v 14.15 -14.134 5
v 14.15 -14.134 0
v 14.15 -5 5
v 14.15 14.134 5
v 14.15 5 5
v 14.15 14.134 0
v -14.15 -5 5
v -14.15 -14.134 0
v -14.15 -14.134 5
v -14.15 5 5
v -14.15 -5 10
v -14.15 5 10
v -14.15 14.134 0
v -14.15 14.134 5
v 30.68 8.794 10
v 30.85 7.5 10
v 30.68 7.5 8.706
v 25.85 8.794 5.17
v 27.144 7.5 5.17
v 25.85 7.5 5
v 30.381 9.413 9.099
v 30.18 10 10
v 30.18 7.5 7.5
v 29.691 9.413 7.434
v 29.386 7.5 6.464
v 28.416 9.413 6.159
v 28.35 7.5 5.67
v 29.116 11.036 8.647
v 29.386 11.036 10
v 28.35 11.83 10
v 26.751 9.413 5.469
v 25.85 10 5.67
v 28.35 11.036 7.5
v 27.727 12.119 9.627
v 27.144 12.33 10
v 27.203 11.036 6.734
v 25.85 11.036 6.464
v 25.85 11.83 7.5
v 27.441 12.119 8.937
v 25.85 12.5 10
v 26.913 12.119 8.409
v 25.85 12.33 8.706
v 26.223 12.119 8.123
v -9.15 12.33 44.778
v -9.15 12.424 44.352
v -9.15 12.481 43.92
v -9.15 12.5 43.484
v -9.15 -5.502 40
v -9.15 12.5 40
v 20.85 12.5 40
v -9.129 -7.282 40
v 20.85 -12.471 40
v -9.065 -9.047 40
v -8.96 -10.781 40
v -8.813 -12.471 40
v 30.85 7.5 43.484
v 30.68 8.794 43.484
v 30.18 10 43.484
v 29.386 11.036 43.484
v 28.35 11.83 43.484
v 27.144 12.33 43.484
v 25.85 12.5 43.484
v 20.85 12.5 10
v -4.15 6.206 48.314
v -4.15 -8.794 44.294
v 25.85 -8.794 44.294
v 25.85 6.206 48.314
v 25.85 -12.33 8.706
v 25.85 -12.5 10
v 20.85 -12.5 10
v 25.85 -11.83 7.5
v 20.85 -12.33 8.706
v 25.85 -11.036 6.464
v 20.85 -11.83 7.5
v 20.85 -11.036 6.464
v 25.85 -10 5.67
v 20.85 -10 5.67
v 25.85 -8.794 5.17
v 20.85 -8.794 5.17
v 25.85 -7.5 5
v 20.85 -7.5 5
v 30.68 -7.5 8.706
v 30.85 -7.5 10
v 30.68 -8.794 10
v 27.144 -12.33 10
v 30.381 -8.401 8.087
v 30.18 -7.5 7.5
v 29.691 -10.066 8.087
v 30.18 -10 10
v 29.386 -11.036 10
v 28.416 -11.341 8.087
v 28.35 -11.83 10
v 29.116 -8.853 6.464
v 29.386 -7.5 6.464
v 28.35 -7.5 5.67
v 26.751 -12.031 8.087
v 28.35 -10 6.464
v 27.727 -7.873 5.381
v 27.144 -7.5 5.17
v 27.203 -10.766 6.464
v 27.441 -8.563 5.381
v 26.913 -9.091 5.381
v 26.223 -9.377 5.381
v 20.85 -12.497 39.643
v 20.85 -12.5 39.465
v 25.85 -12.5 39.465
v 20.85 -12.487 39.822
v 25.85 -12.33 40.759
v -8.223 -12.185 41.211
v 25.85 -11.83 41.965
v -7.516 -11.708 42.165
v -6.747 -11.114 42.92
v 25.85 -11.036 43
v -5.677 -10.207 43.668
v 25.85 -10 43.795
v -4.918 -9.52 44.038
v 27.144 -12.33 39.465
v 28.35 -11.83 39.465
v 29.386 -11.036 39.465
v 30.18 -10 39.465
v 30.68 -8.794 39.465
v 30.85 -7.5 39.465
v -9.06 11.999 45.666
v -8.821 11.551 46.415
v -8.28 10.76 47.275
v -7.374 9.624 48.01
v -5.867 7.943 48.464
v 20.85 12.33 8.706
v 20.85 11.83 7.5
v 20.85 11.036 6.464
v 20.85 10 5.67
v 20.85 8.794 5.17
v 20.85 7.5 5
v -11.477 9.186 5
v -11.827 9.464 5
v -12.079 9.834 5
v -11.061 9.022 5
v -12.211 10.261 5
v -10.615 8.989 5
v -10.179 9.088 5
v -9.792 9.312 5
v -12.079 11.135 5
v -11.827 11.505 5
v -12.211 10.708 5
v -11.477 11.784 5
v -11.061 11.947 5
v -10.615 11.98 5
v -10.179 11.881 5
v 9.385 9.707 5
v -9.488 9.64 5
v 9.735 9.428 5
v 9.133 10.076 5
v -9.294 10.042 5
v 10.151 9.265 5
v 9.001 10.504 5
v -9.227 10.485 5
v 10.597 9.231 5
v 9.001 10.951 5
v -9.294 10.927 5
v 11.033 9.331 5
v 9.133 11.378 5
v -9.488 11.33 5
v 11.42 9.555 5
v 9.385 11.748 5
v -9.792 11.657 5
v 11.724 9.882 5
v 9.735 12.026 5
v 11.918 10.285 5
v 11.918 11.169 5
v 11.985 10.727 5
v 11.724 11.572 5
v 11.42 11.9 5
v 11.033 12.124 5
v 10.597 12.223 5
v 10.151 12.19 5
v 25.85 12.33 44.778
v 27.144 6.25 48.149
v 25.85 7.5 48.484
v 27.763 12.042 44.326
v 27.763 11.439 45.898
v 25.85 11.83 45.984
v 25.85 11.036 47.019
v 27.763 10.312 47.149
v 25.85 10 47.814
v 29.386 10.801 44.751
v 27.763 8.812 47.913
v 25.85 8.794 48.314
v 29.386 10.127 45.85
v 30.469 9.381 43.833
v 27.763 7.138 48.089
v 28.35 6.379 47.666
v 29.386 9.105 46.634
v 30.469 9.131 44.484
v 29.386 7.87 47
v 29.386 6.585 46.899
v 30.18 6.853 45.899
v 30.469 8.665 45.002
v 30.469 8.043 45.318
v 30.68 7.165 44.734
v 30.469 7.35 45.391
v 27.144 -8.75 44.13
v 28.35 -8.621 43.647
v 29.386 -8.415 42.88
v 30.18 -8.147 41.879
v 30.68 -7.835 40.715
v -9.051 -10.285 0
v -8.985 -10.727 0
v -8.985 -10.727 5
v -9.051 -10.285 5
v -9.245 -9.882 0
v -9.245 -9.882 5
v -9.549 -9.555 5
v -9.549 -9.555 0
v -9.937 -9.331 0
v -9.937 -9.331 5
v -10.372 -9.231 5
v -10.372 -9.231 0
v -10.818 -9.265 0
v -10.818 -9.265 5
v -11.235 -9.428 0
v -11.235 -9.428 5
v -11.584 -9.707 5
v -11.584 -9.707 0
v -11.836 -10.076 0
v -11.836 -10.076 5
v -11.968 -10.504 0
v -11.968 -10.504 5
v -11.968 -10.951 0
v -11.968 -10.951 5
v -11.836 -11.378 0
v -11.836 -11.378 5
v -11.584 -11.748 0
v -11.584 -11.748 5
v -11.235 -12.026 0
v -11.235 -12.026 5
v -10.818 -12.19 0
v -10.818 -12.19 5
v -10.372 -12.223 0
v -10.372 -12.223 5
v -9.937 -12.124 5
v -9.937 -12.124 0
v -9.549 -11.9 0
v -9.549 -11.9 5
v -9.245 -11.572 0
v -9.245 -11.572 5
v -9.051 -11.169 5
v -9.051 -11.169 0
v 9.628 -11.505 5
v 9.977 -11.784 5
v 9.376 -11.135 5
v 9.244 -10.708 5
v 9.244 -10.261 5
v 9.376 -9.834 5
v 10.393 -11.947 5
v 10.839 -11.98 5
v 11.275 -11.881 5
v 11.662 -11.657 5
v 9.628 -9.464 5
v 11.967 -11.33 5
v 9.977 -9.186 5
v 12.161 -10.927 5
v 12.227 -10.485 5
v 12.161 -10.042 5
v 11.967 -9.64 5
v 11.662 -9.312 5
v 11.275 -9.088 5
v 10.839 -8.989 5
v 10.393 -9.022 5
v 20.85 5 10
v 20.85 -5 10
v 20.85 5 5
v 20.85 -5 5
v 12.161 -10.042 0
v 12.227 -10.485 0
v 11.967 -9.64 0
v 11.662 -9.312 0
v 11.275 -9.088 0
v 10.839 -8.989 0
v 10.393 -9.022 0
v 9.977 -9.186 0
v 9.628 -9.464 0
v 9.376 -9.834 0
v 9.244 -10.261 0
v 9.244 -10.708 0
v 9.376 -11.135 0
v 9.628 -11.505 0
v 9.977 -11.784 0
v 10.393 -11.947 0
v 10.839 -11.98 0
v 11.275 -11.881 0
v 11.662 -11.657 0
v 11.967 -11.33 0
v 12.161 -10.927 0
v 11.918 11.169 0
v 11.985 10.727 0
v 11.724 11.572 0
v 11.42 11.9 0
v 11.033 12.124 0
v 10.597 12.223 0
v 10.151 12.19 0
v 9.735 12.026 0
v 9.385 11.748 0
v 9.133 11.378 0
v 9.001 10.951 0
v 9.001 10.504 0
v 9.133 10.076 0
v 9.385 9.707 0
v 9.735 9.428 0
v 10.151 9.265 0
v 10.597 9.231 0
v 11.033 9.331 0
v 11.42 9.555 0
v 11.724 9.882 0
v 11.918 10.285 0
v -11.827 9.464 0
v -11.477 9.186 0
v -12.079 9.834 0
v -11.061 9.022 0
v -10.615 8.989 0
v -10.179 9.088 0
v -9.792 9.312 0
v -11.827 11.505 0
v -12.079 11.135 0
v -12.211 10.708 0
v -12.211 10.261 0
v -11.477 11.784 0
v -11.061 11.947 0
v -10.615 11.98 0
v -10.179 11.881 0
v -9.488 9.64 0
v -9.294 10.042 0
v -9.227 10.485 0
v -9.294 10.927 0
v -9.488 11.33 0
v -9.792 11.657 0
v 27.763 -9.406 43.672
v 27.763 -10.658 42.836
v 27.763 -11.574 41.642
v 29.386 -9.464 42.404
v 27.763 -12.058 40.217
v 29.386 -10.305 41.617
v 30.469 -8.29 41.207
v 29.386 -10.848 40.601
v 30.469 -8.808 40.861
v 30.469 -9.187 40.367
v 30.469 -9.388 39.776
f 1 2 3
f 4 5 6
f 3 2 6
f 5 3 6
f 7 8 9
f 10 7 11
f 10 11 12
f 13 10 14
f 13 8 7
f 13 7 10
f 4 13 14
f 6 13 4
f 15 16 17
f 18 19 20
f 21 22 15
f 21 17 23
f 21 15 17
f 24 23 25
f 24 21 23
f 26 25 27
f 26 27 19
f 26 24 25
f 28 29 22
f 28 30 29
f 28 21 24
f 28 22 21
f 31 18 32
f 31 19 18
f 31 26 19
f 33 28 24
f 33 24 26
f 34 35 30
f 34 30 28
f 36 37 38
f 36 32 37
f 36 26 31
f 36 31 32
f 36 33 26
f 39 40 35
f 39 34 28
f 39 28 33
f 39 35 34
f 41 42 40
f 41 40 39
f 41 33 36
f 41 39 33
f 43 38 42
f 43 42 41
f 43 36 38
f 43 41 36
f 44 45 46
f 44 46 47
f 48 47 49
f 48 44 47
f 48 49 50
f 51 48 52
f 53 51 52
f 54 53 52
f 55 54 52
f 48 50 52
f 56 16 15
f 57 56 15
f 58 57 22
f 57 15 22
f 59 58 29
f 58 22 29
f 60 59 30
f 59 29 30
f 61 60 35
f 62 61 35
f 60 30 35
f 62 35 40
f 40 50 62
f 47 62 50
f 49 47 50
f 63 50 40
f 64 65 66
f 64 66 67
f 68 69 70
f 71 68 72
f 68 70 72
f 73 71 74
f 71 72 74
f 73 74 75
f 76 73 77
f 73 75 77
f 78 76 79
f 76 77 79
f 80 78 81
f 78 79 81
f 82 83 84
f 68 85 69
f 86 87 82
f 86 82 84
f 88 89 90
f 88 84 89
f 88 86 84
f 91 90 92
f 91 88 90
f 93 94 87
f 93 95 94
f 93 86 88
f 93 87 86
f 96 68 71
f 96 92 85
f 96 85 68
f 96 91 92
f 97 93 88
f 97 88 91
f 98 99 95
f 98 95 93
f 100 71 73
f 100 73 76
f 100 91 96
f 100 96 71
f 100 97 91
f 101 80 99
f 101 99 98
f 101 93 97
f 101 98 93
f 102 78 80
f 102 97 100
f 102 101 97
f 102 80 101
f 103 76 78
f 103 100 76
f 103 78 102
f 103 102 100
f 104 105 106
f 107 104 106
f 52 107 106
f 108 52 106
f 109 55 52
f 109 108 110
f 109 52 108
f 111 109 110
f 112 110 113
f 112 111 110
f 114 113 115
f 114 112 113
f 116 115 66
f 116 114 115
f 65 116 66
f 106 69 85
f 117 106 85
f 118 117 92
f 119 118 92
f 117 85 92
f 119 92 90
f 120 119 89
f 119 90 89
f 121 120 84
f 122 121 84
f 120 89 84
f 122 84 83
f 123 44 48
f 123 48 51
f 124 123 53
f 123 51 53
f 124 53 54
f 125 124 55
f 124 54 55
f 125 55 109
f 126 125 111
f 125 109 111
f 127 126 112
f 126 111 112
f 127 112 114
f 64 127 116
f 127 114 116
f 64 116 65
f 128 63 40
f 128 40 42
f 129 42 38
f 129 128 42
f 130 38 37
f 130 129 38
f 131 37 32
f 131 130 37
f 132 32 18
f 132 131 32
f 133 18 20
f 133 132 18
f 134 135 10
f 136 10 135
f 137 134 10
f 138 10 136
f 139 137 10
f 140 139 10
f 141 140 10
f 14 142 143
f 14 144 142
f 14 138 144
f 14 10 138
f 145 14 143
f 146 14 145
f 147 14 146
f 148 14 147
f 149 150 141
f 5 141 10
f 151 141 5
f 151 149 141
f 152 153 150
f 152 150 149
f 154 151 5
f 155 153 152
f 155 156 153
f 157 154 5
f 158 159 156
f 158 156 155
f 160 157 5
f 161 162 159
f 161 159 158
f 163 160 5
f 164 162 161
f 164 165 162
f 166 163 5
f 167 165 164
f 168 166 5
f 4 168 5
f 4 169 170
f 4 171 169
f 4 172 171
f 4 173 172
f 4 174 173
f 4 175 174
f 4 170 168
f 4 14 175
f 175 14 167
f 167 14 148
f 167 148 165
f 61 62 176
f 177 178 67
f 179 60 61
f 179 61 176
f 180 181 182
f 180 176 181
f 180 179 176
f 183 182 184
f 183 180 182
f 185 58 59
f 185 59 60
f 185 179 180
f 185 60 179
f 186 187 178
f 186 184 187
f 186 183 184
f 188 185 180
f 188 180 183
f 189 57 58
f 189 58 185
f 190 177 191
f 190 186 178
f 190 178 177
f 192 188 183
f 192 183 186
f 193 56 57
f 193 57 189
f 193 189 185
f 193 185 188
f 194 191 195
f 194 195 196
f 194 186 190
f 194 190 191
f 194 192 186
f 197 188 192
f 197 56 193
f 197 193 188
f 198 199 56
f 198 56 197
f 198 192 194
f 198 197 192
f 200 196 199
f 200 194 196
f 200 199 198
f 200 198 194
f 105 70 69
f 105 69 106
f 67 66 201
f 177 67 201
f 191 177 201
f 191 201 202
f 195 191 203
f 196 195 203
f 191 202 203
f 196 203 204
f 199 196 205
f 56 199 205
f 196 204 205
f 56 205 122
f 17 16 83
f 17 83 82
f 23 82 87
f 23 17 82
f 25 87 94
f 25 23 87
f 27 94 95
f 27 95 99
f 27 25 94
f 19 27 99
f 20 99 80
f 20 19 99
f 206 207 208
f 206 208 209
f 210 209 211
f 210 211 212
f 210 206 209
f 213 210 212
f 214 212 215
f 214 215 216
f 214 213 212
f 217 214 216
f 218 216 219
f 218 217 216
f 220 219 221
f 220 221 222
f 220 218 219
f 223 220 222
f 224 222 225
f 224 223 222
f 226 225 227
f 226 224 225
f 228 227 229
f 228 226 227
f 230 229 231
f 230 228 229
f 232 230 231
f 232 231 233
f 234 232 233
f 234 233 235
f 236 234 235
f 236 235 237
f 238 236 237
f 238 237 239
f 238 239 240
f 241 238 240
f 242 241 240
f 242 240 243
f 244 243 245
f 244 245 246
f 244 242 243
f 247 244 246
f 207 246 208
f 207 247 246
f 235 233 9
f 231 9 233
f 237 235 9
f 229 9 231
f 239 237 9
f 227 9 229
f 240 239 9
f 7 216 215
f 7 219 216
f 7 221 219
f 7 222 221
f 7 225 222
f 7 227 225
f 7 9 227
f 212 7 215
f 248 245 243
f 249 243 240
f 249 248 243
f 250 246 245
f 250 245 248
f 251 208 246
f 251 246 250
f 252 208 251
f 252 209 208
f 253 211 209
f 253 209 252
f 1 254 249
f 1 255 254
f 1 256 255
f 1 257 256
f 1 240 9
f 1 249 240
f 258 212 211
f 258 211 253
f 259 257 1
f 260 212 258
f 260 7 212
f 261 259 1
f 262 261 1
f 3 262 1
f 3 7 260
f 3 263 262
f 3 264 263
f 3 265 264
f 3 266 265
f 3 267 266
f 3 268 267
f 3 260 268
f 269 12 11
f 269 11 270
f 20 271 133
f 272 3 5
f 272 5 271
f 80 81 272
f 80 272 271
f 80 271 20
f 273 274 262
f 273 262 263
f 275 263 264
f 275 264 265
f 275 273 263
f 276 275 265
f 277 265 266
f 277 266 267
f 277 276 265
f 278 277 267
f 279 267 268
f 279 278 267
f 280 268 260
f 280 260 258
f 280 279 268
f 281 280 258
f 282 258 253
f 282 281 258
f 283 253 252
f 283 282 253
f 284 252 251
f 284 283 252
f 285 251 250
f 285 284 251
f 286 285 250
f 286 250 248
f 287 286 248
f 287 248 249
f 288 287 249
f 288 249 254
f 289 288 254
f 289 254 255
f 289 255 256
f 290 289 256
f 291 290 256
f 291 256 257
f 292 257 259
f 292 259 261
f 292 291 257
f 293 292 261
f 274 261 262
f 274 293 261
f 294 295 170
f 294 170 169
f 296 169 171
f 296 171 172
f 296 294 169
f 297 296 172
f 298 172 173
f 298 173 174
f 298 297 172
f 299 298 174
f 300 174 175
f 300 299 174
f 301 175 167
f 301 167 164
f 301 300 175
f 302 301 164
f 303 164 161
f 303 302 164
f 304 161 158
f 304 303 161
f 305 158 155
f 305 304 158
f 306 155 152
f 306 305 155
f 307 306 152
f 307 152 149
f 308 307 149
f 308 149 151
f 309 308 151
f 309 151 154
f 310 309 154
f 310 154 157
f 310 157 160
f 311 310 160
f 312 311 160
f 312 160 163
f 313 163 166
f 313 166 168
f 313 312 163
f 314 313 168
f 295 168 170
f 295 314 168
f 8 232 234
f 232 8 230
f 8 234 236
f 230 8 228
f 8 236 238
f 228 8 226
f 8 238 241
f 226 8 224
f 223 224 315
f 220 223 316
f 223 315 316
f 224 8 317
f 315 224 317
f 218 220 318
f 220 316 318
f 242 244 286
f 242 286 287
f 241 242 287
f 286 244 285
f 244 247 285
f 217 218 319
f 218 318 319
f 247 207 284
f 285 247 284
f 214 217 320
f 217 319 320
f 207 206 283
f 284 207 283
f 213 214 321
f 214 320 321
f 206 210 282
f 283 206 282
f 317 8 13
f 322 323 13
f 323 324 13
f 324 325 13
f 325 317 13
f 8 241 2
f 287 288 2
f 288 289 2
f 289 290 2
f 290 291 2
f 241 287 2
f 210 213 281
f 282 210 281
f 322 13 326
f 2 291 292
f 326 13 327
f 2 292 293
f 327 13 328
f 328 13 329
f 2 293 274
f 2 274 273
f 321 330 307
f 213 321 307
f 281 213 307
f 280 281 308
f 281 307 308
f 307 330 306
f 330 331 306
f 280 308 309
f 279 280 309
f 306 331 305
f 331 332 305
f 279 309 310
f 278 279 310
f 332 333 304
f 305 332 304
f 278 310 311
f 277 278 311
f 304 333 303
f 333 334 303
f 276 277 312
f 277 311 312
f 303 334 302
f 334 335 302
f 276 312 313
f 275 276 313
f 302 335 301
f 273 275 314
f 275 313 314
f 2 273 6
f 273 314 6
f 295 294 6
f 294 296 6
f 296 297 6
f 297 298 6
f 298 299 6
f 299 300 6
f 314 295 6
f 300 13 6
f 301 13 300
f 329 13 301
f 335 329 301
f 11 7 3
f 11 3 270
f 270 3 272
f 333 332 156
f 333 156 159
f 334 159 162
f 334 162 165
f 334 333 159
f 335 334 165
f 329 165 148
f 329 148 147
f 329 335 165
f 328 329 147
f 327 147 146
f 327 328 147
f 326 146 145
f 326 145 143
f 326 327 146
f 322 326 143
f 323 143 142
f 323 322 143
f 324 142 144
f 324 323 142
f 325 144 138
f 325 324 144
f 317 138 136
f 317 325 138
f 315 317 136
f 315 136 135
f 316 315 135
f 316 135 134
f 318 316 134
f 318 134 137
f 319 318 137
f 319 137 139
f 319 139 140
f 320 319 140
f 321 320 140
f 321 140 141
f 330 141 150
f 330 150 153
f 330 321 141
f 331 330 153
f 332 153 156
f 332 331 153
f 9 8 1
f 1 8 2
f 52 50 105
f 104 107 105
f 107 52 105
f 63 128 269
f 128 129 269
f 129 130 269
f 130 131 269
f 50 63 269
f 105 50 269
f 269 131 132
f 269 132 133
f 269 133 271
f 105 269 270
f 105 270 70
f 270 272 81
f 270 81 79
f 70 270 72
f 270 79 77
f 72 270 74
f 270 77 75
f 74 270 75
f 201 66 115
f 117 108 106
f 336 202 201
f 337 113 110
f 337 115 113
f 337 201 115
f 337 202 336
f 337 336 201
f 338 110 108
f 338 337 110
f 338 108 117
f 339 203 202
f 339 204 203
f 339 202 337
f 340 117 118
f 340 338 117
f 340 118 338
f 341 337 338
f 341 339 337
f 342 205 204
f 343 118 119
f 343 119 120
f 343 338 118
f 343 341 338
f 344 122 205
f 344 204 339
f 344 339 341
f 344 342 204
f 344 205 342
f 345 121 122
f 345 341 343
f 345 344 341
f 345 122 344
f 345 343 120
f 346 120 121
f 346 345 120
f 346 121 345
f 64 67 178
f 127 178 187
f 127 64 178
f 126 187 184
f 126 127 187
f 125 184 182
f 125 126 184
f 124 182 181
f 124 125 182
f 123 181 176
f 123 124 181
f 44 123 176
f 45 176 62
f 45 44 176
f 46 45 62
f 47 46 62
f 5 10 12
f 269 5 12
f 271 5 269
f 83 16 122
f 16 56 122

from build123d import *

# Parameters (mm, degrees)
F0_W          = 28.3
F0_H          = 28.2685337434
F0_R          = 1.5
F1_DEPTH      = 5
F2_W          = 45
F2_H          = 10
F3_DEPTH      = 5
F4_W          = 10
F4_H          = 25
F5_DEPTH      = 35
F7_DEPTH      = 30
F7_DEPTH_BACK = 10
F8_T1_DEPTH   = 51.2903171605
F8_T3_DEPTH   = 50.8819045103
F8_T5_DEPTH   = 44.5915873497
F8_T7_DEPTH   = 15.5291427062
F8_T9_DEPTH   = 33.4838731358
F8_T11_DEPTH  = 29.4646352493
F8_T13_DEPTH  = 15
F8_T15_DEPTH  = 17.5
F8_T20_DEPTH  = 5
F8_T26_DEPTH  = 5
F8_S31_W      = 5
F8_S31_H      = 5
F8_T32_DEPTH  = 5
F8_S37_W      = 5
F8_S37_H      = 5
F8_T38_DEPTH  = 5


# Not quite as in the source:
# - a fillet or chamfer that OpenCascade refuses, or shapes differently, is made with other operations: its cross-section is extruded or revolved along the edge and cut away or added


with BuildPart() as f1:
    # F0 (on Top) → F1 (new body)
    with BuildSketch(Plane.XY):
        Rectangle(F0_W, F0_H)
        with Locations((-10.4845586502, -10.7272564019)):
            Circle(F0_R, mode=Mode.SUBTRACT)
        with Locations((10.7272564019, -10.4845586502)):
            Circle(F0_R, mode=Mode.SUBTRACT)
        with Locations((-10.7272564019, 10.4845586502)):
            Circle(F0_R, mode=Mode.SUBTRACT)
        with Locations((10.4845586502, 10.7272564019)):
            Circle(F0_R, mode=Mode.SUBTRACT)
    extrude(amount=F1_DEPTH)

    # F2 (on face) → F3 (join)
    with BuildSketch(Plane.XY.offset(5)):
        with Locations((8.35, 0)):
            Rectangle(F2_W, F2_H)
    extrude(amount=F3_DEPTH)

    # F4 (on face) → F5 (join)
    with BuildSketch(Plane(origin=(0, 0, 5), x_dir=(1, 0, 0), z_dir=(0, 0, -1))):
        with Locations((25.85, 0)):
            Rectangle(F4_W, F4_H)
    extrude(amount=-F5_DEPTH)

    # F6 (on face) → F7 (join, two sides)
    with BuildSketch(Plane(origin=(20.85, 0, 0), x_dir=(0, -1, 0), z_dir=(-1, 0, 0))) as f7_sk:
        Polygon((-12.5, 50), (-12.5, 40), (12.5, 40), (12.5, 43.3012701892), align=None)
    extrude(amount=F7_DEPTH)
    extrude(f7_sk.sketch, amount=-F7_DEPTH_BACK)

    # F8: fillet of radius 5 on 9 edges, made by hand

    # F8_s2 → F8_t1 (cut)
    with BuildSketch(Plane.YZ.offset(-25.4403171605)):
        with BuildLine():
            ThreePointArc((6.2059047745, 48.3135022672), (10.543807145, 47.4506398373), (12.5, 43.4838731358))
            Line((12.5, 43.4838731358), (12.5, 50))
            Line((12.5, 50), (6.2059047745, 48.3135022672))
        make_face()
    extrude(amount=F8_T1_DEPTH, mode=Mode.SUBTRACT)

    # F8_s4 → F8_t3 (cut)
    with BuildSketch(Plane(origin=(0, -12.911414055, -3.4596029692), x_dir=(1, 0, 0), z_dir=(0, 0.9659258263, 0.2588190451))):
        with BuildLine():
            ThreePointArc((-9.15, -40.0610532507), (-7.6855339059, -43.5965871566), (-4.15, -45.0610532507))
            Line((-4.15, -45.0610532507), (-9.15, -45.0610532507))
            Line((-9.15, -45.0610532507), (-9.15, -40.0610532507))
        make_face()
    extrude(amount=F8_T3_DEPTH, mode=Mode.SUBTRACT)

    # F8_s6 → F8_t5 (cut)
    with BuildSketch(Plane.YZ.offset(-18.7415873497)):
        with BuildLine():
            ThreePointArc((-12.5, 39.4646352493), (-11.4667667015, 42.5084423944), (-8.7940952255, 44.2942643808))
            Line((-8.7940952255, 44.2942643808), (-12.5, 43.3012701892))
            Line((-12.5, 43.3012701892), (-12.5, 39.4646352493))
        make_face()
    extrude(amount=F8_T5_DEPTH, mode=Mode.SUBTRACT)

    # F8_s8 → F8_t7 (cut)
    with BuildSketch(Plane(origin=(0, 2.8685635481, 0.7686292862), x_dir=(1, 0, 0), z_dir=(0, 0.9659258263, 0.2588190451))):
        with BuildLine():
            ThreePointArc((25.85, -45.0610532507), (29.3855339059, -43.5965871566), (30.85, -40.0610532507))
            Line((30.85, -40.0610532507), (30.85, -45.0610532507))
            Line((30.85, -45.0610532507), (25.85, -45.0610532507))
        make_face()
    extrude(amount=F8_T7_DEPTH, mode=Mode.SUBTRACT)

    # F8_s10 → F8_t9 (cut)
    with BuildSketch(Plane.XY.offset(10)):
        with BuildLine():
            ThreePointArc((30.85, 7.5), (29.3855339059, 11.0355339059), (25.85, 12.5))
            Line((25.85, 12.5), (30.85, 12.5))
            Line((30.85, 12.5), (30.85, 7.5))
        make_face()
    extrude(amount=F8_T9_DEPTH, mode=Mode.SUBTRACT)

    # F8_s12 → F8_t11 (cut)
    with BuildSketch(Plane.XY.offset(10)):
        with BuildLine():
            ThreePointArc((25.85, -12.5), (29.3855339059, -11.0355339059), (30.85, -7.5))
            Line((30.85, -7.5), (30.85, -12.5))
            Line((30.85, -12.5), (25.85, -12.5))
        make_face()
    extrude(amount=F8_T11_DEPTH, mode=Mode.SUBTRACT)

    # F8_s14 → F8_t13 (cut)
    with BuildSketch(Plane.XZ.offset(-7.5)):
        with BuildLine():
            ThreePointArc((30.85, 10), (29.3855339059, 6.4644660941), (25.85, 5))
            Line((25.85, 5), (30.85, 5))
            Line((30.85, 5), (30.85, 10))
        make_face()
    extrude(amount=F8_T13_DEPTH, mode=Mode.SUBTRACT)

    # F8_s16 → F8_t15 (cut)
    with BuildSketch(Plane.YZ.offset(8.35)):
        with BuildLine():
            ThreePointArc((12.5, 10), (11.0355339059, 6.4644660941), (7.5, 5))
            Line((7.5, 5), (12.5, 5))
            Line((12.5, 5), (12.5, 10))
        make_face()
        with BuildLine():
            ThreePointArc((-12.5, 10), (-11.0355339059, 6.4644660941), (-7.5, 5))
            Line((-7.5, 5), (-12.5, 5))
            Line((-12.5, 5), (-12.5, 10))
        make_face()
    extrude(amount=F8_T15_DEPTH, mode=Mode.SUBTRACT)


with BuildPart() as f8_tool18:
    # F8_s19 → F8_t20 (new body)
    with BuildSketch(Plane.YZ.offset(25.85)):
        Polygon((7.5, 43.4838731358), (12.5, 43.4838731358), (12.5, 50), (6.2059047745, 48.3135022672), align=None)
    extrude(amount=F8_T20_DEPTH)

    # F8_s21 → F8_t22 (revolve, cut)
    with BuildSketch(Plane(origin=(25.85, 7.5, 43.4838731358), x_dir=(0, -0.608761429, -0.7933533403), z_dir=(0, -0.7933533403, 0.608761429))):
        with BuildLine():
            ThreePointArc((0, -5), (5, 0), (0, 5))
            Line((0, 5), (0, -5))
        make_face()
    revolve(axis=Axis((25.85, 7.5, 43.4838731358), (1, 0, 0)), mode=Mode.SUBTRACT)


with BuildPart() as f1_1:
    add(f1.part)

    # F8_t17: cut F8_tool18
    add(f8_tool18.part, mode=Mode.SUBTRACT)


with BuildPart() as f8_tool24:
    # F8_s25 → F8_t26 (new body)
    with BuildSketch(Plane.YZ.offset(25.85)):
        Polygon((-7.5, 39.4646352493), (-12.5, 39.4646352493), (-12.5, 43.3012701892), (-8.7940952255, 44.2942643808), align=None)
    extrude(amount=F8_T26_DEPTH)

    # F8_s27 → F8_t28 (revolve, cut)
    with BuildSketch(Plane(origin=(25.85, -7.5, 39.4646352493), x_dir=(0, 0.7933533403, -0.608761429), z_dir=(0, -0.608761429, -0.7933533403))):
        with BuildLine():
            ThreePointArc((0, -5), (5, 0), (0, 5))
            Line((0, 5), (0, -5))
        make_face()
    revolve(axis=Axis((25.85, -7.5, 39.4646352493), (1, 0, 0)), mode=Mode.SUBTRACT)


with BuildPart() as f1_2:
    add(f1_1.part)

    # F8_t23: cut F8_tool24
    add(f8_tool24.part, mode=Mode.SUBTRACT)


with BuildPart() as f8_tool30:
    # F8_s31 → F8_t32 (new body)
    with BuildSketch(Plane.XZ.offset(-7.5)):
        with Locations((28.35, 7.5)):
            Rectangle(F8_S31_W, F8_S31_H)
    extrude(amount=-F8_T32_DEPTH)

    # F8_s33 → F8_t34 (revolve, cut)
    with BuildSketch(Plane(origin=(25.85, 7.5, 10), x_dir=(-0.7071067812, 0, 0.7071067812), z_dir=(-0.7071067812, 0, -0.7071067812))):
        with BuildLine():
            ThreePointArc((0, -5), (5, 0), (0, 5))
            Line((0, 5), (0, -5))
        make_face()
    revolve(axis=Axis((25.85, 7.5, 10), (0, 1, 0)), mode=Mode.SUBTRACT)


with BuildPart() as f1_3:
    add(f1_2.part)

    # F8_t29: cut F8_tool30
    add(f8_tool30.part, mode=Mode.SUBTRACT)


with BuildPart() as f8_tool36:
    # F8_s37 → F8_t38 (new body)
    with BuildSketch(Plane.XY.offset(10)):
        with Locations((28.35, -10)):
            Rectangle(F8_S37_W, F8_S37_H)
    extrude(amount=-F8_T38_DEPTH)

    # F8_s39 → F8_t40 (revolve, cut)
    with BuildSketch(Plane(origin=(25.85, -7.5, 10), x_dir=(-0.7071067812, 0.7071067812, 0), z_dir=(-0.7071067812, -0.7071067812, 0))):
        with BuildLine():
            ThreePointArc((0, -5), (5, 0), (0, 5))
            Line((0, 5), (0, -5))
        make_face()
    revolve(axis=Axis((25.85, -7.5, 10), (0, 0, -1)), mode=Mode.SUBTRACT)


with BuildPart() as f1_4:
    add(f1_3.part)

    # F8_t35: cut F8_tool36
    add(f8_tool36.part, mode=Mode.SUBTRACT)


solid = f1_4.part
